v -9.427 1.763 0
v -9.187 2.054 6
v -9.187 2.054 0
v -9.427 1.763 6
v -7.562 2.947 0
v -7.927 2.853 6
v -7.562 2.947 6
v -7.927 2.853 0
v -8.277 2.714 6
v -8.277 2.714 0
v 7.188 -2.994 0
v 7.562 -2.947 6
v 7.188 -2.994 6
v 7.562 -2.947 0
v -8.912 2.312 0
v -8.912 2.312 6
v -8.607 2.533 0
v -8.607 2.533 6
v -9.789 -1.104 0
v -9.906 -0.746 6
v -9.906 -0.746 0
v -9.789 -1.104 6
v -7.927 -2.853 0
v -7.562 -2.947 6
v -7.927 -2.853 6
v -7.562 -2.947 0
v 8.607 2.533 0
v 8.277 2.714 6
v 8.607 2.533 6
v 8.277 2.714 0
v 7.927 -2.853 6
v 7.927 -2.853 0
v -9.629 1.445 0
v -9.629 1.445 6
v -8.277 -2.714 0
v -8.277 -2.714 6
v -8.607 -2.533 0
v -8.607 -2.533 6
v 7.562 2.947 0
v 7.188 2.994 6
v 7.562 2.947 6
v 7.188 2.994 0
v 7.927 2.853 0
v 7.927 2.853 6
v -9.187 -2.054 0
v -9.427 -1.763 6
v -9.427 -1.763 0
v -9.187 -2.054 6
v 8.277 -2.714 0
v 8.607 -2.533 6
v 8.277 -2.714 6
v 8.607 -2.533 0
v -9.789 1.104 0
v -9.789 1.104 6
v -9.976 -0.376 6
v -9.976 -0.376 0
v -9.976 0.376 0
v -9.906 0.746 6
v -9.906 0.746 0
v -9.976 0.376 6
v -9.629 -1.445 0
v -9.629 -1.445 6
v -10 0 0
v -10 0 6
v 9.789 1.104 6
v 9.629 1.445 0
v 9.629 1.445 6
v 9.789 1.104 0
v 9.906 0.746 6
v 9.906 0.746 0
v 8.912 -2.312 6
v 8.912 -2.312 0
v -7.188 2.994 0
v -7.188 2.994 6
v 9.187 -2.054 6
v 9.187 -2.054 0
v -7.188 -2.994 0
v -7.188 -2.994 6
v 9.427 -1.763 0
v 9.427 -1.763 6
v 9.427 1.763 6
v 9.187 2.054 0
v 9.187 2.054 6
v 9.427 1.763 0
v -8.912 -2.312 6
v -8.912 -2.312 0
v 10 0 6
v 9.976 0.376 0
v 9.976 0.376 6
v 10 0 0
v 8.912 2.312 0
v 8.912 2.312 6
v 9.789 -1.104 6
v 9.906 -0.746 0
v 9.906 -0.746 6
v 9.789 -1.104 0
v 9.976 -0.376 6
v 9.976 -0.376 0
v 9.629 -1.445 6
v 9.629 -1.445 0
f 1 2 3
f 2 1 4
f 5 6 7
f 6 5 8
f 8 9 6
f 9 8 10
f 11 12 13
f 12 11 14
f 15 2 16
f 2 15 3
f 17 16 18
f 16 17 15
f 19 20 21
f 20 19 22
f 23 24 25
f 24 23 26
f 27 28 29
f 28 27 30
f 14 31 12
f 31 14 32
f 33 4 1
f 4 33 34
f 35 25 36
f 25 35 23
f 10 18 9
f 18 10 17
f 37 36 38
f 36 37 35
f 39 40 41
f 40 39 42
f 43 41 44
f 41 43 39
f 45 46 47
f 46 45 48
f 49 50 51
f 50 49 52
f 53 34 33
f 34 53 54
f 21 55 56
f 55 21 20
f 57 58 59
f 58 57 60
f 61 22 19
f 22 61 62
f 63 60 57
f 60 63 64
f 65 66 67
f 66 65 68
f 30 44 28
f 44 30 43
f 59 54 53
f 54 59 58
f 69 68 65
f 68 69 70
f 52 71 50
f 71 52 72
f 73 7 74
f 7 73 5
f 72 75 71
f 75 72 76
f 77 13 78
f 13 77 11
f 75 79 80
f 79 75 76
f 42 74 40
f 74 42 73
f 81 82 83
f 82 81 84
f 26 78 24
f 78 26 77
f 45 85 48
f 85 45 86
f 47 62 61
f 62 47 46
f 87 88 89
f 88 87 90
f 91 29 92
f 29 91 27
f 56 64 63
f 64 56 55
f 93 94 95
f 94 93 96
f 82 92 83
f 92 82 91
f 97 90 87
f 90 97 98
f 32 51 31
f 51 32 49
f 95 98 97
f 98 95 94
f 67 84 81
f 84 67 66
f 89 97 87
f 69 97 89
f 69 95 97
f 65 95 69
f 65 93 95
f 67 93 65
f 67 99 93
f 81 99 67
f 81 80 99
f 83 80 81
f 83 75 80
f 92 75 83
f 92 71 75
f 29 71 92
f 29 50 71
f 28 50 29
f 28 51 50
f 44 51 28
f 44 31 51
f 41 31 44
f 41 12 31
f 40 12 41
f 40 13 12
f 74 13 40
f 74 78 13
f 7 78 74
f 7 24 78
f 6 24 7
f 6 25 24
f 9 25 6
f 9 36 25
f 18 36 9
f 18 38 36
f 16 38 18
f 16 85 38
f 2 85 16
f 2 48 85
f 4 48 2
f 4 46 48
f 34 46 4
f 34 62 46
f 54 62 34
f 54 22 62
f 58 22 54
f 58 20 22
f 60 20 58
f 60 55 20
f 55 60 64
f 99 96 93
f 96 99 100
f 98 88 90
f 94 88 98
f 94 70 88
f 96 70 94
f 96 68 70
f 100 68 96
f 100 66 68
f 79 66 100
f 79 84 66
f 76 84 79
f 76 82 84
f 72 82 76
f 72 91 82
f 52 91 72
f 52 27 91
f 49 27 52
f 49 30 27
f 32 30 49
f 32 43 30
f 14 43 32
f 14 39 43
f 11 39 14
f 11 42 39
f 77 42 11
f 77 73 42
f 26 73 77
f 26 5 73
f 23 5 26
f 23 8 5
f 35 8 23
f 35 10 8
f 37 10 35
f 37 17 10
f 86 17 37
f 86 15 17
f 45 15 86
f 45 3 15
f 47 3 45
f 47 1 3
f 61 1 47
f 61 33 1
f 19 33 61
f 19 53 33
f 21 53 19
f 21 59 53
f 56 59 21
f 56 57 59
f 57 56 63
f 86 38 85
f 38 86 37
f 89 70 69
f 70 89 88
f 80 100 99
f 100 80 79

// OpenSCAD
$fn = 50;

difference() {
	union() {
		hull() {
			translate(v = [7.0, 0, 0]) {
				cylinder(h = 6, r = 3, r1 = 3, r2 = 3);
			}
			translate(v = [-7.0, 0, 0]) {
				cylinder(h = 6, r = 3, r1 = 3, r2 = 3);
			}
		}
	}
	union();
}
